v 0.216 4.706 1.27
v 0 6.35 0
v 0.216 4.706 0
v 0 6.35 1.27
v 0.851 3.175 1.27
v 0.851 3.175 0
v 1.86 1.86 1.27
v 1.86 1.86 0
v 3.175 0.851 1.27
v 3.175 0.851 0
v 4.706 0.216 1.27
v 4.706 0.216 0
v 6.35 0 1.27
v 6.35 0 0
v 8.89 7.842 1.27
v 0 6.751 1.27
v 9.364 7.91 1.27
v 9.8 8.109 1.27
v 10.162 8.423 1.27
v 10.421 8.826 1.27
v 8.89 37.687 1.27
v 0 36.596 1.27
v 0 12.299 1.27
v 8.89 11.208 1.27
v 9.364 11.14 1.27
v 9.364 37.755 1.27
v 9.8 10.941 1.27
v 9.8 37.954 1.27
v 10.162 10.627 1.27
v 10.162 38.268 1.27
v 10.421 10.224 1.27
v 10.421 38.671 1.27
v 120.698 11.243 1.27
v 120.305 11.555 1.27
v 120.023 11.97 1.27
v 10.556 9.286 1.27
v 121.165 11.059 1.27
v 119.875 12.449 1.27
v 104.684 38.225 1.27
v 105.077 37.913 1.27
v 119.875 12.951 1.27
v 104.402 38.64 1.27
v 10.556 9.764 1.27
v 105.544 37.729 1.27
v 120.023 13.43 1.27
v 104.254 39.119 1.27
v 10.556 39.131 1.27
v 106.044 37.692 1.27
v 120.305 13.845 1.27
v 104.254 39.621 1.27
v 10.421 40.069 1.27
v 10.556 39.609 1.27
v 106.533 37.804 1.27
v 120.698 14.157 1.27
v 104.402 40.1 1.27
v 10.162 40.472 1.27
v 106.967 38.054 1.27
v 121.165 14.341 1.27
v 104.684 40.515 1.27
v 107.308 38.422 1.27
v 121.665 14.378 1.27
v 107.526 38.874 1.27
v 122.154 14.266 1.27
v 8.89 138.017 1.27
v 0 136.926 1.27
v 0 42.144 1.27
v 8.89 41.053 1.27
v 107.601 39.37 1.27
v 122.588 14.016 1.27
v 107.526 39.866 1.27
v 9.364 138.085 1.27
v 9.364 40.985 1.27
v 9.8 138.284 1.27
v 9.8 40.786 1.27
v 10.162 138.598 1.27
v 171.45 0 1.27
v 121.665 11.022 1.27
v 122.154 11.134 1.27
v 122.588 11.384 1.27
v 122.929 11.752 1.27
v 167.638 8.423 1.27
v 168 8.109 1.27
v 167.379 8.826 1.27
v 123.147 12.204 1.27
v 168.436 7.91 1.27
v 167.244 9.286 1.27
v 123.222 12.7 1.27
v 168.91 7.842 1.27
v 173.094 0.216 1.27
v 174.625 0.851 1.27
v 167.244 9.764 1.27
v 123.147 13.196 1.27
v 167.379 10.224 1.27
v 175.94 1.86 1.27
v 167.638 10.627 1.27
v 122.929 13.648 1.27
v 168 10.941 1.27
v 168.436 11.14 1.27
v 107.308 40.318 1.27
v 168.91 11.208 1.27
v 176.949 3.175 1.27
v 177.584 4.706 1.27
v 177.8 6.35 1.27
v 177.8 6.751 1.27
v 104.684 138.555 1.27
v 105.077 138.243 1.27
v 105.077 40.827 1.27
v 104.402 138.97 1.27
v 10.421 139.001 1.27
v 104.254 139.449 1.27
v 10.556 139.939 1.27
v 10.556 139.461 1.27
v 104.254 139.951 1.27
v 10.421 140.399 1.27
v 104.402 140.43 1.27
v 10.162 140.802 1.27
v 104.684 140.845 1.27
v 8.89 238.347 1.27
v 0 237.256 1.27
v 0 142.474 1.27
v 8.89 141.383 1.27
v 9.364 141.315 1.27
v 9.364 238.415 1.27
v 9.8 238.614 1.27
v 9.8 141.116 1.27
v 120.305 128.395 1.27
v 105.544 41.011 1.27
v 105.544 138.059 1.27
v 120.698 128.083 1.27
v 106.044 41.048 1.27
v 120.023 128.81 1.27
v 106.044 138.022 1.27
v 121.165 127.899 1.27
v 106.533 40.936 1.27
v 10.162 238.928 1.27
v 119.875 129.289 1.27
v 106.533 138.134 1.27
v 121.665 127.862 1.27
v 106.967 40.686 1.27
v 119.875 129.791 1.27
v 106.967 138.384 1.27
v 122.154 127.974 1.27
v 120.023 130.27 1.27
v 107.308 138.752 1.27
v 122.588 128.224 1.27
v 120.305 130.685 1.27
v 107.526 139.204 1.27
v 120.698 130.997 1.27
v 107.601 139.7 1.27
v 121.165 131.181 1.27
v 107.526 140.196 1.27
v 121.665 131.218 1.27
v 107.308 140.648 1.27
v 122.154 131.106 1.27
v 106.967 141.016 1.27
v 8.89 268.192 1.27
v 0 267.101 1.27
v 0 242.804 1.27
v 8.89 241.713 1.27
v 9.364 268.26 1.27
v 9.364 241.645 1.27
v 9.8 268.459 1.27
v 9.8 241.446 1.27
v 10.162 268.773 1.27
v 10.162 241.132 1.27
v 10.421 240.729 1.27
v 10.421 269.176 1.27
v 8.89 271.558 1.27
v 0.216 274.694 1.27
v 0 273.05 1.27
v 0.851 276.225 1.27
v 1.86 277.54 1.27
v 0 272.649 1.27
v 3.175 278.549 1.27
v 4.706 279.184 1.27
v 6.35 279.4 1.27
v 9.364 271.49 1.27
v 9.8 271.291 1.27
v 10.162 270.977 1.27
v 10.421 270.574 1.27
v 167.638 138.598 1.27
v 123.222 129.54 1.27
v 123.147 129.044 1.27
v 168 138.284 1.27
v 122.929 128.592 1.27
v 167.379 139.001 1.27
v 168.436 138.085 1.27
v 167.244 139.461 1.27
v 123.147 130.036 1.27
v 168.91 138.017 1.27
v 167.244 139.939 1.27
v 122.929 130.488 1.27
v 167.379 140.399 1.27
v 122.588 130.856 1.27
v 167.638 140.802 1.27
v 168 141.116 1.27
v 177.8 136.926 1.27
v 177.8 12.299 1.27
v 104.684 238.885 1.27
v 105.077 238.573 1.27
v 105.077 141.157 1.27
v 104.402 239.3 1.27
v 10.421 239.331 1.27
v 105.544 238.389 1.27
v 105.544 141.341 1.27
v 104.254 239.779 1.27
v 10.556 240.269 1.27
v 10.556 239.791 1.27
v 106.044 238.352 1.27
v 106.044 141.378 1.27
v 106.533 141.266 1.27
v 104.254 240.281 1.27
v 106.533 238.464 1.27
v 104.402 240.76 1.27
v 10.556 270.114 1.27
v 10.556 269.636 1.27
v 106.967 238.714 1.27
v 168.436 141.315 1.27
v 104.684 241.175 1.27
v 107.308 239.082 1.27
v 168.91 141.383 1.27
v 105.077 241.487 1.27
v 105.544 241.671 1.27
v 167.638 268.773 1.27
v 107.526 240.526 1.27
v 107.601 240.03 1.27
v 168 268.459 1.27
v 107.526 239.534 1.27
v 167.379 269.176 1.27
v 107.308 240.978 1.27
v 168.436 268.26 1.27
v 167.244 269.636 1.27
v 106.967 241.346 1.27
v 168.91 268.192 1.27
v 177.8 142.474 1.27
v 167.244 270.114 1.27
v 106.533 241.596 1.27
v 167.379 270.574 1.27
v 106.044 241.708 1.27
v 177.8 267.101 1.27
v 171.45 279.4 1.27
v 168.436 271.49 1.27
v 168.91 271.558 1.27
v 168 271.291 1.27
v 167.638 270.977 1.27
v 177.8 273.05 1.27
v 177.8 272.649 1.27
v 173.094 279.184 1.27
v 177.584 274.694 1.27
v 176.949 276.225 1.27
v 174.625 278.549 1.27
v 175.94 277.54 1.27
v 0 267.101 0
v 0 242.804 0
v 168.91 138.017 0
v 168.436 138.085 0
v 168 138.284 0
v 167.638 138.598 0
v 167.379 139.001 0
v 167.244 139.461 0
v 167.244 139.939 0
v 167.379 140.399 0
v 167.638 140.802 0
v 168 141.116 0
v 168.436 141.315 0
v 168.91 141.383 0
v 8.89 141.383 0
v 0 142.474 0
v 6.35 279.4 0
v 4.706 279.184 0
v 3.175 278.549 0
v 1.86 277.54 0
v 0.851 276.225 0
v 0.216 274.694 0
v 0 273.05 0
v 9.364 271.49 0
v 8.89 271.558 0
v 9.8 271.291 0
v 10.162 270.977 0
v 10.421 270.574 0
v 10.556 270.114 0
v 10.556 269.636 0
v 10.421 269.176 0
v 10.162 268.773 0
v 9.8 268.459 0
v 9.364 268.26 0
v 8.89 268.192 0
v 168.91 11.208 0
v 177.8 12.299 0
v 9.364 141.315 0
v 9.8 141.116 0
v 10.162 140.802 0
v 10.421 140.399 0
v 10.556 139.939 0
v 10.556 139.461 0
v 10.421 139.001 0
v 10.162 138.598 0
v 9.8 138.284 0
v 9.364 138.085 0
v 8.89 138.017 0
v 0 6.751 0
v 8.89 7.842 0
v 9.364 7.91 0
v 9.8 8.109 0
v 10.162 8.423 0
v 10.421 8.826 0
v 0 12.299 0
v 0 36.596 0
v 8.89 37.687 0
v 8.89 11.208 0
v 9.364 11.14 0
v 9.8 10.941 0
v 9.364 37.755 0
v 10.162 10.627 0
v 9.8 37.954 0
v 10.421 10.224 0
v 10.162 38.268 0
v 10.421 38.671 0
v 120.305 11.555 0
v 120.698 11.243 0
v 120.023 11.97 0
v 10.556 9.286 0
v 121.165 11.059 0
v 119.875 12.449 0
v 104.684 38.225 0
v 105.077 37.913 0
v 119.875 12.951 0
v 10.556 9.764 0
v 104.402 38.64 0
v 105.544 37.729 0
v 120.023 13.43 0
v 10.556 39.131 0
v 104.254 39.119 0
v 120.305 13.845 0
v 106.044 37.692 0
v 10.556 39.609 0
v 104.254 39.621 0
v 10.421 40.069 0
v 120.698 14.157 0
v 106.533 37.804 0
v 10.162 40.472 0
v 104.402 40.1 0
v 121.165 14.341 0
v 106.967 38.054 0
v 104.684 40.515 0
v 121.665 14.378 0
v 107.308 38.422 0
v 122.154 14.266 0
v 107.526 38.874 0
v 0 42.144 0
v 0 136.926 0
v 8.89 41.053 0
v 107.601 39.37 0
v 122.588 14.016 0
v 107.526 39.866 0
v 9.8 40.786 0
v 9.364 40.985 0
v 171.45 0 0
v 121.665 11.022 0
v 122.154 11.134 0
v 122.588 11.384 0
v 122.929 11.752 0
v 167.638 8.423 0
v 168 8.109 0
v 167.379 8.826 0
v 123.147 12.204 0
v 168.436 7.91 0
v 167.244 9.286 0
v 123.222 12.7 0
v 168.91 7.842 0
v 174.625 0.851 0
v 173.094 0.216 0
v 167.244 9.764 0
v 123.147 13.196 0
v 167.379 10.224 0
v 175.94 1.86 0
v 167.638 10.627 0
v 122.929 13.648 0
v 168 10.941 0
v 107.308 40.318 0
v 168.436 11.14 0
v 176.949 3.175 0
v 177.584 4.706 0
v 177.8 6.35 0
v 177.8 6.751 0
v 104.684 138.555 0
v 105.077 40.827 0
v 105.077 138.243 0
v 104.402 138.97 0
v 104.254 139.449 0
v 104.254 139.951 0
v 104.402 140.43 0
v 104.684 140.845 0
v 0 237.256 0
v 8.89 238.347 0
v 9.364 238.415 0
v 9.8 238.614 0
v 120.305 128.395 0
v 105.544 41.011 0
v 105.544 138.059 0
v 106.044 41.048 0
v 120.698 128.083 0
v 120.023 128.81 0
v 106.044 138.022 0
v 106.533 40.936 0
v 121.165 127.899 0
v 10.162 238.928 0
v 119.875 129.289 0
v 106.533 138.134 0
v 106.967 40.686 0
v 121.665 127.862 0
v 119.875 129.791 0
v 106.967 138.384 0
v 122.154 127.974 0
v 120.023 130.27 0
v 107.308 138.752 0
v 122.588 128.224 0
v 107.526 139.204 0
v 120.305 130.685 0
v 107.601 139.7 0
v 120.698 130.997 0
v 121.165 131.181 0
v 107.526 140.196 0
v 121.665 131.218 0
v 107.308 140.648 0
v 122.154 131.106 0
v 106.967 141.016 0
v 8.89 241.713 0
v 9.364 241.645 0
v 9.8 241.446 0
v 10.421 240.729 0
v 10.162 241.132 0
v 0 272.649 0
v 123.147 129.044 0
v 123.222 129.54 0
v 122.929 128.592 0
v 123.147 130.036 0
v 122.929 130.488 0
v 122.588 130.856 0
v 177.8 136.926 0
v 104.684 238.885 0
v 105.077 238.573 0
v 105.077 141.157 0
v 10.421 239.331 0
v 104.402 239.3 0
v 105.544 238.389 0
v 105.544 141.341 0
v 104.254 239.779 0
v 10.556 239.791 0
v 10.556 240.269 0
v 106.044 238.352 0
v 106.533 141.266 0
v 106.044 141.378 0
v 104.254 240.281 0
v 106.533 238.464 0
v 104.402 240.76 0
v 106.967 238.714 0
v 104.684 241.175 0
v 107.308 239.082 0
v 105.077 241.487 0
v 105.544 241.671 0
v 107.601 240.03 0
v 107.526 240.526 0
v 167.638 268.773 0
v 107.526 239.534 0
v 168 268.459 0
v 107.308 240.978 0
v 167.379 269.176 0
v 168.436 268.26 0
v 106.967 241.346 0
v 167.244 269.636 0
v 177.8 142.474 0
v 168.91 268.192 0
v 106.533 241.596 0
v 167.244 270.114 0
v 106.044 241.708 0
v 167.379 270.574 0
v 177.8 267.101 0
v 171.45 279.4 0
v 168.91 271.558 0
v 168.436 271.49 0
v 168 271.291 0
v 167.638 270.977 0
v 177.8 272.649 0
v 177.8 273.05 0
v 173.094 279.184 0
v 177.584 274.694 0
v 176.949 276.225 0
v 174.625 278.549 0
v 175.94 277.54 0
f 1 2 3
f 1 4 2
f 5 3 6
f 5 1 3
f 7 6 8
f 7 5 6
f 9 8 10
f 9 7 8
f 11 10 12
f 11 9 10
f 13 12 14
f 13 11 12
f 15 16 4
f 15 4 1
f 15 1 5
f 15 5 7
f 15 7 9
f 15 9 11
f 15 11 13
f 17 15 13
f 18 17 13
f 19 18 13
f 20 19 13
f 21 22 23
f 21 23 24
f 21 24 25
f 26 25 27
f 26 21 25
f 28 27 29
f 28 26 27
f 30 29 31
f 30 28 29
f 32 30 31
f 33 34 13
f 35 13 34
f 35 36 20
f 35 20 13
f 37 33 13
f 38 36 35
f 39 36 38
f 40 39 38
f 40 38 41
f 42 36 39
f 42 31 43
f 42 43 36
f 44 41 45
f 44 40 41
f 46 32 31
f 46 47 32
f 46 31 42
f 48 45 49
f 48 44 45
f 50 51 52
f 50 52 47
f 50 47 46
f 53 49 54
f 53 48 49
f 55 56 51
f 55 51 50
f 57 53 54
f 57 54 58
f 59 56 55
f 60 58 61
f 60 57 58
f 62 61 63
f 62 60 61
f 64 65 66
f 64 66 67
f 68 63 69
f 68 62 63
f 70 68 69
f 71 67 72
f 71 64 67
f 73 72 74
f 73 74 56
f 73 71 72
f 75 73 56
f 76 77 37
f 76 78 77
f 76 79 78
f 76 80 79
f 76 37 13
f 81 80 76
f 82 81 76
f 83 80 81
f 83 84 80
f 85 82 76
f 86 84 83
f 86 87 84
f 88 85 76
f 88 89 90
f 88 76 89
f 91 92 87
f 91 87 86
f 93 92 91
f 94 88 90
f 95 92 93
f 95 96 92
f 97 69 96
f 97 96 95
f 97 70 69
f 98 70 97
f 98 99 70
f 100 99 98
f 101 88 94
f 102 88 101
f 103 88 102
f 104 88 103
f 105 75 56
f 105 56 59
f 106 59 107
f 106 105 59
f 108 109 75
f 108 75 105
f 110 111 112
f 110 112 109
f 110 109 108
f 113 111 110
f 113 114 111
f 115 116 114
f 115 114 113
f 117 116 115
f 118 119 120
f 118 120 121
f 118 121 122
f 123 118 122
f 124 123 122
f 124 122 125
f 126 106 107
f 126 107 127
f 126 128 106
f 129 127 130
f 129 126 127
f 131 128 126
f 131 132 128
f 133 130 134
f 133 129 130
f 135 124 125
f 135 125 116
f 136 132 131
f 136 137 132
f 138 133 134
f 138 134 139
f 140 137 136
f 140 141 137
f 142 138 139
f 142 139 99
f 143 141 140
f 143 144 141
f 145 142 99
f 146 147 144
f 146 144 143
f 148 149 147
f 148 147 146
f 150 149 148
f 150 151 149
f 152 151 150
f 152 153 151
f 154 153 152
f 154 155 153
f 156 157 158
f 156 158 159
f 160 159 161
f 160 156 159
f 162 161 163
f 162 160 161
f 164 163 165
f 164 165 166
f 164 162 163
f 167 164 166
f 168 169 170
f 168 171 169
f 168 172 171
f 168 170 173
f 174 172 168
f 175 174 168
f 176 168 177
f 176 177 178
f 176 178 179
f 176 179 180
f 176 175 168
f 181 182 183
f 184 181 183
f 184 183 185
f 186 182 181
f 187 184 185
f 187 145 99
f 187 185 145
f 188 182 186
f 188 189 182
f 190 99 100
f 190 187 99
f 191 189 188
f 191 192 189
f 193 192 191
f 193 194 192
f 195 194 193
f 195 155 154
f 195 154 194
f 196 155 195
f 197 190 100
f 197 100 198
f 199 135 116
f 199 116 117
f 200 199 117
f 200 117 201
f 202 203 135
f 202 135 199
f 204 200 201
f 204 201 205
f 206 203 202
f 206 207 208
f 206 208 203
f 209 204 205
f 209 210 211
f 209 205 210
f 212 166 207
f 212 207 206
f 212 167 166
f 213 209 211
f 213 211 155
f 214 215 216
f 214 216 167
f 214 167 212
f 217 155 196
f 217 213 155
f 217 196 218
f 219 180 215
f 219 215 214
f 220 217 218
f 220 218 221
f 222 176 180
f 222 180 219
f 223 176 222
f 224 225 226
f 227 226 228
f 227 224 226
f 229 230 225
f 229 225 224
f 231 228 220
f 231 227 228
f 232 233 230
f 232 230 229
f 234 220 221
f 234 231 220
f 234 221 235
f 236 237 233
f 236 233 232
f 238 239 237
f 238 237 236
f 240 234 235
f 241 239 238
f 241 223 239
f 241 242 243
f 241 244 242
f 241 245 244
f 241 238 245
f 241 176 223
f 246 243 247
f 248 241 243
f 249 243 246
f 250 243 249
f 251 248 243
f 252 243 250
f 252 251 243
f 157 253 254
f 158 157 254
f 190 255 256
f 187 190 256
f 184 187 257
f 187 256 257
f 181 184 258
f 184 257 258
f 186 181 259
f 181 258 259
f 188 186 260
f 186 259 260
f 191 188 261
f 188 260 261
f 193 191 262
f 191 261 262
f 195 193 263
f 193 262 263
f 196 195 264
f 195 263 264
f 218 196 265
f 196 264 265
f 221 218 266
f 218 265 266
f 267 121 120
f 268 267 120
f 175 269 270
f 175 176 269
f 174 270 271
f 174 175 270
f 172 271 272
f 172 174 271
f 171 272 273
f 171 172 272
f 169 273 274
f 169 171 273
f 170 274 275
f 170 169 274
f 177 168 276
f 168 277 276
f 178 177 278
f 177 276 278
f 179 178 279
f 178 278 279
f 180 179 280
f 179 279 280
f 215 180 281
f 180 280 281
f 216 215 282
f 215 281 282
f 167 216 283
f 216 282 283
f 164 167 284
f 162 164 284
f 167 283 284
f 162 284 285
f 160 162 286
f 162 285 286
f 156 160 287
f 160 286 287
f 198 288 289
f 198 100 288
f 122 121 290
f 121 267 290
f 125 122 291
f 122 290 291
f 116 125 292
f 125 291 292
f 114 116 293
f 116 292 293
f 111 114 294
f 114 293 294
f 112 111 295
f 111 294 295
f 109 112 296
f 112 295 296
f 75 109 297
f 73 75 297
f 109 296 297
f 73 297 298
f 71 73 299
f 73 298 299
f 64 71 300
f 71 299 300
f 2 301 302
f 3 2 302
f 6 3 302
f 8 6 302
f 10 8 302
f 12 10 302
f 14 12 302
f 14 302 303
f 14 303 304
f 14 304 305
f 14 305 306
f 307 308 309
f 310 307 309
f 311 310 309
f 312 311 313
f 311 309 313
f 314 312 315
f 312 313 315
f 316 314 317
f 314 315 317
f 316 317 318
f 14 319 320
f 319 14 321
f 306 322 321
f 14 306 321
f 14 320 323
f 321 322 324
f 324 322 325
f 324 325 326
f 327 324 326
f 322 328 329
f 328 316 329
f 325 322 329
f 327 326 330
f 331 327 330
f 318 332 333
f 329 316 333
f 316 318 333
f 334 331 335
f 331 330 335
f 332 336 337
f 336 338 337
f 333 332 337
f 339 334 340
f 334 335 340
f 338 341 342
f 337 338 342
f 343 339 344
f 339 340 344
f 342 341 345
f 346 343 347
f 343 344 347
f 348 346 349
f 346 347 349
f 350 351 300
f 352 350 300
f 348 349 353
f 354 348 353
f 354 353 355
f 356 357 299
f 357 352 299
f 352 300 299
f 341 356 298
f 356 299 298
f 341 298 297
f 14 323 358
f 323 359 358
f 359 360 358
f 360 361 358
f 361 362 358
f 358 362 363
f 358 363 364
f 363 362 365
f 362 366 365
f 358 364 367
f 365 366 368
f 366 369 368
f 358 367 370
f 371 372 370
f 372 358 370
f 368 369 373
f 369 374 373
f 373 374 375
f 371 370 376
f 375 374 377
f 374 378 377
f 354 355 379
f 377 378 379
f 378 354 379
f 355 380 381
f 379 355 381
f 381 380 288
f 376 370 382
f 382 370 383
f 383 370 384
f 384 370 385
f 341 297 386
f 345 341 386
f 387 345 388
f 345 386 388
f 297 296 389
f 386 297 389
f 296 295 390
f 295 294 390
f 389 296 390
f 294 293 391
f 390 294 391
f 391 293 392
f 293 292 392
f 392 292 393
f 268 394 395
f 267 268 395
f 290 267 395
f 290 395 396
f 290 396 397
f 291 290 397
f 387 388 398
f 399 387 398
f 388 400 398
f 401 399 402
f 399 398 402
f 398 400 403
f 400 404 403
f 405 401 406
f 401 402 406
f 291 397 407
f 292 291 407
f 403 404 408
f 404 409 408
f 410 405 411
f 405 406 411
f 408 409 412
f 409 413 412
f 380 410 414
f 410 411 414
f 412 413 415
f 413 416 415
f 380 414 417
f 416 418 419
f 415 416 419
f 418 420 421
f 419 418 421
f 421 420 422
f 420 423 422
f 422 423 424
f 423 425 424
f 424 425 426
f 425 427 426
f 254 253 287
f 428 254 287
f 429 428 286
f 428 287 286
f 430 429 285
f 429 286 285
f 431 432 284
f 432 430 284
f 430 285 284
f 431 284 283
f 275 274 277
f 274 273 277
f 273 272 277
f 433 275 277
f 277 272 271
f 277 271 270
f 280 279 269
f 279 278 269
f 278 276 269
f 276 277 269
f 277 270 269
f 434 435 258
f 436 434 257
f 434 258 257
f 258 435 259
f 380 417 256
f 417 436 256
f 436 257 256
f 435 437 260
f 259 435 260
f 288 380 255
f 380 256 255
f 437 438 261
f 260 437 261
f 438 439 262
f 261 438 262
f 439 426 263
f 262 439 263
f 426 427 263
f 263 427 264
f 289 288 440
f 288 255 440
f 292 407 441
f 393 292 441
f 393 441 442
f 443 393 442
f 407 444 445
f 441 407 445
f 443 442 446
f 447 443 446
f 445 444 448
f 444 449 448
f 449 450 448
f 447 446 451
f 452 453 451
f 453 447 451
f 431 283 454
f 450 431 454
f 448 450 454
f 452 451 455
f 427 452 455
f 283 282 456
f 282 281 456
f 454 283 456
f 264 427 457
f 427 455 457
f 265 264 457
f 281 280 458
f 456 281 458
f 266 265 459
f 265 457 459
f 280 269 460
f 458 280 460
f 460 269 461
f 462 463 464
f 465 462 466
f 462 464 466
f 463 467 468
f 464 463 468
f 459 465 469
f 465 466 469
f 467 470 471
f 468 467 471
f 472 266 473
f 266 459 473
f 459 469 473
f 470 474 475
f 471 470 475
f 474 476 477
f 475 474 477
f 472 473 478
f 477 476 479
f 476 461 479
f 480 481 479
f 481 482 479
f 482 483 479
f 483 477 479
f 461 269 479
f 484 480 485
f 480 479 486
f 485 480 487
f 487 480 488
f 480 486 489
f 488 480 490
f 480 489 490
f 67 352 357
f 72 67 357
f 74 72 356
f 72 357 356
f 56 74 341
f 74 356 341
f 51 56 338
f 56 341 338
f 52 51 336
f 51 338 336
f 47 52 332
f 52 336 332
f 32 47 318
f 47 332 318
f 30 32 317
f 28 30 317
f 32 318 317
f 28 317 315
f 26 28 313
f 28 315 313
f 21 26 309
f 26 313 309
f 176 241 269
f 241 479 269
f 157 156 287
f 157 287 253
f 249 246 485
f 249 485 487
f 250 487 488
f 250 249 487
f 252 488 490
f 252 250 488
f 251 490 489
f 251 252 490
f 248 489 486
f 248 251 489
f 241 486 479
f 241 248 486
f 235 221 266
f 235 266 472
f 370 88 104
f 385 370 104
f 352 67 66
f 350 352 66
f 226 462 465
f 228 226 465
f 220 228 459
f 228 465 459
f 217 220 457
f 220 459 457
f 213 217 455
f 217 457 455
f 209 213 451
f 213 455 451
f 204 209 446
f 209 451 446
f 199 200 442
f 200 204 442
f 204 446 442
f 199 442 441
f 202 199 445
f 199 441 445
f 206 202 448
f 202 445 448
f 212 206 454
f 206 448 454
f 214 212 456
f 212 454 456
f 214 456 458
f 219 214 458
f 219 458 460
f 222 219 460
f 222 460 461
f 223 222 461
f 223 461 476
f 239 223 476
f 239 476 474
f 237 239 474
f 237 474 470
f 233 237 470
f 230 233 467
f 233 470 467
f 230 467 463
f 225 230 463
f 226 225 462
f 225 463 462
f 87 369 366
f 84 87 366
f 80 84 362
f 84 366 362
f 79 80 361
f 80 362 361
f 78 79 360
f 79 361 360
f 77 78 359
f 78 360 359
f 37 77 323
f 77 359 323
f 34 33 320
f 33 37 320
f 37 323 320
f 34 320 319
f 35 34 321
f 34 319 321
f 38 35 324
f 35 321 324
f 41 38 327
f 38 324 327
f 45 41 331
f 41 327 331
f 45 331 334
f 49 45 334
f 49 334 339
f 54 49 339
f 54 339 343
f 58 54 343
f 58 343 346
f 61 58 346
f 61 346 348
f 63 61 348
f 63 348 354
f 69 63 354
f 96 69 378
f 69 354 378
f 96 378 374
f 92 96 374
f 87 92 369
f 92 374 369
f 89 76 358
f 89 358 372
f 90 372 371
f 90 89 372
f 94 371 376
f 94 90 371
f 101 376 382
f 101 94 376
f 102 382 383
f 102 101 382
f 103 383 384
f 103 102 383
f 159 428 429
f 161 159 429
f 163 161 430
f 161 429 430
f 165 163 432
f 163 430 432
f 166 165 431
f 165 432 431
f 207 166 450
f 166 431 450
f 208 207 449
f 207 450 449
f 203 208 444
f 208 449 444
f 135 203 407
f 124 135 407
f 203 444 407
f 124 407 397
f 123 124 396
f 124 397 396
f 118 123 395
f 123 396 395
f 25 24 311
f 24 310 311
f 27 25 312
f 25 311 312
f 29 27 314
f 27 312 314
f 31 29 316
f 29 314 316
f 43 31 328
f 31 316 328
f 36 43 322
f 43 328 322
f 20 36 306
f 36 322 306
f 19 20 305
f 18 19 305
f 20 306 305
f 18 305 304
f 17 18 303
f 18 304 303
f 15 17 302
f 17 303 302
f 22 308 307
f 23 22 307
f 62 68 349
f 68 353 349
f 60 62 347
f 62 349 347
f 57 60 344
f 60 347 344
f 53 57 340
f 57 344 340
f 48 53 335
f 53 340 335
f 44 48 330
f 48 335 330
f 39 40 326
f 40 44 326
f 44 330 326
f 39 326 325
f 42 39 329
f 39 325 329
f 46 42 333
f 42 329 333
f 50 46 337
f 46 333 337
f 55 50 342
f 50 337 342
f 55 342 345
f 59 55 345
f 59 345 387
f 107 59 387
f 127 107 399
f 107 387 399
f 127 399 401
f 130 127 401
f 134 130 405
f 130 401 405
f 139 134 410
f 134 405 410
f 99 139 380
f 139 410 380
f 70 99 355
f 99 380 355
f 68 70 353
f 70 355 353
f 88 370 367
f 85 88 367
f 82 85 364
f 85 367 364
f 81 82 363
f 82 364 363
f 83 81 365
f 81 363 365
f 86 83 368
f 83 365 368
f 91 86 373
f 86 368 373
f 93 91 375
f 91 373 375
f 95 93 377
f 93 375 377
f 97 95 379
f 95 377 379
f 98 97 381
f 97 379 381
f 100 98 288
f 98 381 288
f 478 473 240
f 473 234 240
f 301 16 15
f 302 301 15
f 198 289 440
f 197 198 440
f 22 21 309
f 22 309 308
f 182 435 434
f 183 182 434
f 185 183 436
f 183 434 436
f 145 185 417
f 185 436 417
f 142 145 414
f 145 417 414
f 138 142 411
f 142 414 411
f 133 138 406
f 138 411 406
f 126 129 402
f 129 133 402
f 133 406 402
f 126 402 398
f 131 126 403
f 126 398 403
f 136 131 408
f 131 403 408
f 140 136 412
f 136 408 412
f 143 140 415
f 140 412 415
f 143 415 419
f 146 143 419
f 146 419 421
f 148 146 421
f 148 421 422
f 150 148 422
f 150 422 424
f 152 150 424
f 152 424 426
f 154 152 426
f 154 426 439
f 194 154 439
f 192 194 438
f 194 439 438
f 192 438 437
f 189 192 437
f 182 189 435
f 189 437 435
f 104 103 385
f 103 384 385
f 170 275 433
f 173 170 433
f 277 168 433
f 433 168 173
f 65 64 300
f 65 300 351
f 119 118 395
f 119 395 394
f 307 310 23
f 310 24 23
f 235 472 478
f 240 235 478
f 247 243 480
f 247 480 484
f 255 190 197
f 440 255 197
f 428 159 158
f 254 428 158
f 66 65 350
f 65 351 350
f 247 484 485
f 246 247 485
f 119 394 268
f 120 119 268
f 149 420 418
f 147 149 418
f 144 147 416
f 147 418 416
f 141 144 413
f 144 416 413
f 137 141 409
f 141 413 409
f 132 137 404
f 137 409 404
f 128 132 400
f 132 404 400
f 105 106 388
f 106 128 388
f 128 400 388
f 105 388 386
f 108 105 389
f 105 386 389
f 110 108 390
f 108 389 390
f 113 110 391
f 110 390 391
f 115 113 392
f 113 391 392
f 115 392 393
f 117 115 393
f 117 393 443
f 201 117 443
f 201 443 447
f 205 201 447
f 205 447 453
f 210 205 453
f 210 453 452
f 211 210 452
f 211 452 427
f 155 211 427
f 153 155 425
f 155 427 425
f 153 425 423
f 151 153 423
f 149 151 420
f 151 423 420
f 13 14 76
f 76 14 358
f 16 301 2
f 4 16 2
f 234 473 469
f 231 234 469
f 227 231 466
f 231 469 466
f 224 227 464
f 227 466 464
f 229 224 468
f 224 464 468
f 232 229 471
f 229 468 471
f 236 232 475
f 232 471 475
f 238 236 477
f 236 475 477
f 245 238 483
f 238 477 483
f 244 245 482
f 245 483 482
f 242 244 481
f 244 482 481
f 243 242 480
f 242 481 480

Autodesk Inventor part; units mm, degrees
ref_plane "YZ Plane" through (0, 0, 0) normal (1, 0, 0) x (0, 1, 0)
ref_plane "XZ Plane" through (0, 0, 0) normal (0, 1, 0) x (-1, 0, 0)
ref_plane "XY Plane" through (0, 0, 0) normal (0, 0, 1) x (1, 0, 0)
sketch "Sketch1" plane through (0, 0, 0) normal (0, 0, 1) x (1, 0, 0)
  line L0 (0, 0) -> (177.8, 0)
  line L1 (177.8, 0) -> (177.8, 279.4)
  line L2 (177.8, 279.4) -> (0, 279.4)
  line L3 (0, 279.4) -> (0, 0)
  line L4 (8.89, 279.4) -> (168.91, 279.4)
  line L5 (168.91, 0) -> (8.89, 0)
  circle A0 centre (8.89, 139.7) radius 1.6828
  circle A1 centre (8.89, 269.875) radius 1.6828
  circle A2 centre (8.89, 9.525) radius 1.6827
  circle A3 centre (168.91, 9.525) radius 1.6827
  circle A4 centre (168.91, 139.7) radius 1.6827
  circle A5 centre (168.91, 269.875) radius 1.6828
  line L6 (13.843, 279.4) -> (163.957, 279.4)
  line L7 (163.957, 0) -> (13.843, 0)
  circle A6 centre (8.89, 240.03) radius 1.6828
  circle A7 centre (8.89, 39.37) radius 1.6828
  circle A8 centre (105.918, 39.37) radius 1.6827
  circle A9 centre (105.918, 139.7) radius 1.6827
  circle A10 centre (105.918, 240.03) radius 1.6828
  circle A11 centre (121.539, 12.7) radius 1.6827
  circle A12 centre (121.539, 129.54) radius 1.6828
  dimension "d0" = 177.8
  dimension "d1" = 279.4
  dimension "d12" = 3.3655
  dimension "d15" = 3.3655
  dimension "d16" = 3.3655
  dimension "d17" = 3.3655
  dimension "d18" = 3.3655
  dimension "d19" = 3.3655
  dimension "d27" = 3.3655
  dimension "d28" = 3.3655
  dimension "d31" = 3.3655
  dimension "d32" = 3.3655
  dimension "d33" = 3.3655
  dimension "d42" = 3.3655
  dimension "d43" = 3.3655
  dimension "d50" = 8.89
  dimension "d51" = 105.918
  dimension "d52" = 121.539
  dimension "d53" = 168.91
  dimension "d54" = 9.525
  dimension "d55" = 39.37
  dimension "d56" = 12.7
  dimension "d57" = 139.7
  dimension "d58" = 129.54
  dimension "d59" = 240.03
  dimension "d60" = 269.875
extrude "Extrusion1" add sketch "Sketch1" along normal blind 1.27
fillet "Fillet1" radius 6.35 4 edges at (0, 279.4, 0.635) (177.8, 279.4, 0.635) (0, 0, 0.635) (177.8, 0, 0.635)
sketch "Sketch2" plane through (0, 0, 1.27) normal (0, 0, 1) x (1, 0, 0)
  arc A0 (171.45, 0) -> (177.8, 6.35) centre (171.45, 6.35) ccw projected
  line L0 (177.8, 6.35) -> (177.8, 273.05) projected
  arc A1 (177.8, 273.05) -> (171.45, 279.4) centre (171.45, 273.05) ccw projected
  line L1 (171.45, 279.4) -> (6.35, 279.4) projected
  arc A2 (6.35, 279.4) -> (0, 273.05) centre (6.35, 273.05) ccw projected
  line L2 (0, 273.05) -> (0, 6.35) projected
  arc A3 (0, 6.35) -> (6.35, 0) centre (6.35, 6.35) ccw projected
  line L3 (6.35, 0) -> (171.45, 0) projected
  circle A4 centre (121.539, 129.54) radius 1.6828 projected
  circle A5 centre (121.539, 12.7) radius 1.6827 projected
  circle A6 centre (105.918, 240.03) radius 1.6828 projected
  circle A7 centre (105.918, 139.7) radius 1.6827 projected
  circle A8 centre (105.918, 39.37) radius 1.6827 projected
  circle A9 centre (8.89, 39.37) radius 1.6828 projected
  circle A10 centre (8.89, 240.03) radius 1.6828 projected
  circle A11 centre (168.91, 269.875) radius 1.6828 projected
  circle A12 centre (168.91, 139.7) radius 1.6827 projected
  circle A13 centre (168.91, 9.525) radius 1.6827 projected
  circle A14 centre (8.89, 9.525) radius 1.6827 projected
  circle A15 centre (8.89, 269.875) radius 1.6828 projected
  circle A16 centre (8.89, 139.7) radius 1.6828 projected
  line L4 (8.89, 141.3827) -> (0, 142.4743)
  line L5 (8.89, 138.0173) -> (0, 136.9257)
  line L6 (0, 142.4743) -> (0, 136.9257)
  arc A17 (8.89, 141.3827) -> (8.89, 138.0173) centre (8.89, 139.7) ccw
  line L7 (8.89, 141.3827) -> (0, 142.4743)
  line L8 (8.89, 138.0173) -> (0, 136.9257)
  line L9 (0, 142.4743) -> (0, 136.9257)
  arc A18 (8.89, 141.3827) -> (8.89, 138.0173) centre (8.89, 139.7) ccw
  line L10 (8.89, 241.7127) -> (0, 242.8043)
  line L11 (8.89, 238.3472) -> (0, 237.2557)
  line L12 (0, 242.8043) -> (0, 237.2557)
  arc A19 (8.89, 241.7127) -> (8.89, 238.3472) centre (8.89, 240.03) ccw
  line L13 (8.89, 271.5577) -> (0, 272.6493)
  line L14 (8.89, 268.1922) -> (0, 267.1007)
  line L15 (0, 272.6493) -> (0, 267.1007)
  arc A20 (8.89, 271.5577) -> (8.89, 268.1922) centre (8.89, 269.875) ccw
  line L16 (8.89, 41.0527) -> (0, 42.1443)
  line L17 (8.89, 37.6872) -> (0, 36.5957)
  line L18 (0, 42.1443) -> (0, 36.5957)
  arc A21 (8.89, 41.0527) -> (8.89, 37.6872) centre (8.89, 39.37) ccw
  line L19 (8.89, 11.2077) -> (0, 12.2993)
  line L20 (8.89, 7.8422) -> (0, 6.7507)
  line L21 (0, 12.2993) -> (0, 6.7507)
  arc A22 (8.89, 11.2077) -> (8.89, 7.8422) centre (8.89, 9.525) ccw
  line L22 (168.91, 138.0173) -> (177.8, 136.9257)
  line L23 (168.91, 141.3827) -> (177.8, 142.4743)
  line L24 (177.8, 136.9257) -> (177.8, 142.4743)
  arc A23 (168.91, 138.0173) -> (168.91, 141.3827) centre (168.91, 139.7) ccw
  line L25 (168.91, 138.0173) -> (177.8, 136.9257)
  line L26 (168.91, 141.3827) -> (177.8, 142.4743)
  line L27 (177.8, 136.9257) -> (177.8, 142.4743)
  arc A24 (168.91, 138.0173) -> (168.91, 141.3827) centre (168.91, 139.7) ccw
  line L28 (168.91, 268.1923) -> (177.8, 267.1007)
  line L29 (168.91, 271.5577) -> (177.8, 272.6493)
  line L30 (177.8, 267.1007) -> (177.8, 272.6493)
  arc A25 (168.91, 268.1923) -> (168.91, 271.5577) centre (168.91, 269.875) ccw
  line L31 (168.91, 7.8423) -> (177.8, 6.7507)
  line L32 (168.91, 11.2078) -> (177.8, 12.2993)
  line L33 (177.8, 6.7507) -> (177.8, 12.2993)
  arc A26 (168.91, 7.8423) -> (168.91, 11.2078) centre (168.91, 9.525) ccw
  point P0 (0, 0)
extrude "Extrusion2" cut sketch "Sketch2" against normal blind 1.27 contours L31 A13 L32 L0 | L22 A12 L23 L0 | L2 L4 A16 L5 | L2 L13 A15 L14
sketch "Sketch3" plane through (0, 0, 1.27) normal (0, 0, 1) x (1, 0, 0)
  circle A0 centre (8.89, 9.525) radius 1.6827 projected
  circle A1 centre (168.91, 269.875) radius 1.6828 projected
  circle A2 centre (8.89, 240.03) radius 1.6828 projected
  circle A3 centre (8.89, 39.37) radius 1.6828 projected
  circle A4 centre (105.918, 39.37) radius 1.6827 projected
  circle A5 centre (105.918, 139.7) radius 1.6827 projected
  circle A6 centre (105.918, 240.03) radius 1.6828 projected
  circle A7 centre (121.539, 12.7) radius 1.6827 projected
  circle A8 centre (121.539, 129.54) radius 1.6828 projected
  line L0 (8.89, 268.1922) -> (0, 267.1007) projected
  line L1 (0, 267.1007) -> (0, 142.4743) projected
  line L2 (0, 142.4743) -> (8.89, 141.3827) projected
  arc A9 (8.89, 138.0173) -> (8.89, 141.3827) centre (8.89, 139.7) ccw projected
  line L3 (8.89, 138.0173) -> (0, 136.9257) projected
  line L4 (0, 136.9257) -> (0, 6.35) projected
  arc A10 (0, 6.35) -> (6.35, 0) centre (6.35, 6.35) ccw projected
  line L5 (6.35, 0) -> (171.45, 0) projected
  arc A11 (171.45, 0) -> (177.8, 6.35) centre (171.45, 6.35) ccw projected
  line L6 (177.8, 6.35) -> (177.8, 6.7507) projected
  line L7 (177.8, 6.7507) -> (168.91, 7.8423) projected
  arc A12 (168.91, 11.2078) -> (168.91, 7.8423) centre (168.91, 9.525) ccw projected
  line L8 (168.91, 11.2078) -> (177.8, 12.2993) projected
  line L9 (177.8, 12.2993) -> (177.8, 136.9257) projected
  line L10 (177.8, 136.9257) -> (168.91, 138.0173) projected
  arc A13 (168.91, 141.3827) -> (168.91, 138.0173) centre (168.91, 139.7) ccw projected
  line L11 (168.91, 141.3827) -> (177.8, 142.4743) projected
  line L12 (177.8, 142.4743) -> (177.8, 273.05) projected
  arc A14 (177.8, 273.05) -> (171.45, 279.4) centre (171.45, 273.05) ccw projected
  line L13 (171.45, 279.4) -> (6.35, 279.4) projected
  arc A15 (6.35, 279.4) -> (0, 273.05) centre (6.35, 273.05) ccw projected
  line L14 (0, 273.05) -> (0, 272.6493) projected
  line L15 (0, 272.6493) -> (8.89, 271.5577) projected
  arc A16 (8.89, 268.1922) -> (8.89, 271.5577) centre (8.89, 269.875) ccw projected
  line L16 (8.89, 11.2077) -> (0, 12.2993)
  line L17 (0, 12.2993) -> (0, 6.7507)
  line L18 (0, 6.7507) -> (8.89, 7.8422)
  arc A17 (8.89, 11.2077) -> (8.89, 7.8422) centre (8.89, 9.525) ccw
  point P0 (0, 0)
extrude "Extrusion3" cut sketch "Sketch3" against normal blind 1.27 contours A0 L18 L4 L16
sketch "Sketch4" plane through (0, 0, 1.27) normal (0, 0, 1) x (1, 0, 0)
  circle A0 centre (121.539, 129.54) radius 1.6828 projected
  circle A1 centre (121.539, 12.7) radius 1.6827 projected
  circle A2 centre (105.918, 240.03) radius 1.6828 projected
  circle A3 centre (105.918, 139.7) radius 1.6827 projected
  circle A4 centre (105.918, 39.37) radius 1.6827 projected
  circle A5 centre (8.89, 39.37) radius 1.6828 projected
  circle A6 centre (8.89, 240.03) radius 1.6828 projected
  circle A7 centre (168.91, 269.875) radius 1.6828 projected
  line L0 (8.89, 7.8422) -> (0, 6.7507) projected
  line L1 (0, 6.7507) -> (0, 6.35) projected
  arc A8 (0, 6.35) -> (6.35, 0) centre (6.35, 6.35) ccw projected
  line L2 (6.35, 0) -> (171.45, 0) projected
  arc A9 (171.45, 0) -> (177.8, 6.35) centre (171.45, 6.35) ccw projected
  line L3 (177.8, 6.35) -> (177.8, 6.7507) projected
  line L4 (177.8, 6.7507) -> (168.91, 7.8423) projected
  arc A10 (168.91, 11.2078) -> (168.91, 7.8423) centre (168.91, 9.525) ccw projected
  line L5 (168.91, 11.2078) -> (177.8, 12.2993) projected
  line L6 (177.8, 12.2993) -> (177.8, 136.9257) projected
  line L7 (177.8, 136.9257) -> (168.91, 138.0173) projected
  arc A11 (168.91, 141.3827) -> (168.91, 138.0173) centre (168.91, 139.7) ccw projected
  line L8 (168.91, 141.3827) -> (177.8, 142.4743) projected
  line L9 (177.8, 142.4743) -> (177.8, 273.05) projected
  arc A12 (177.8, 273.05) -> (171.45, 279.4) centre (171.45, 273.05) ccw projected
  line L10 (171.45, 279.4) -> (6.35, 279.4) projected
  arc A13 (6.35, 279.4) -> (0, 273.05) centre (6.35, 273.05) ccw projected
  line L11 (0, 273.05) -> (0, 272.6493) projected
  line L12 (0, 272.6493) -> (8.89, 271.5577) projected
  arc A14 (8.89, 268.1922) -> (8.89, 271.5577) centre (8.89, 269.875) ccw projected
  line L13 (8.89, 268.1922) -> (0, 267.1007) projected
  line L14 (0, 267.1007) -> (0, 142.4743) projected
  line L15 (0, 142.4743) -> (8.89, 141.3827) projected
  arc A15 (8.89, 138.0173) -> (8.89, 141.3827) centre (8.89, 139.7) ccw projected
  line L16 (8.89, 138.0173) -> (0, 136.9257) projected
  line L17 (0, 136.9257) -> (0, 12.2993) projected
  line L18 (0, 12.2993) -> (8.89, 11.2077) projected
  arc A16 (8.89, 7.8422) -> (8.89, 11.2077) centre (8.89, 9.525) ccw projected
  line L19 (8.89, 41.0527) -> (0, 42.1443)
  line L20 (8.89, 37.6872) -> (0, 36.5957)
  line L21 (0, 42.1443) -> (0, 36.5957)
  arc A17 (8.89, 41.0527) -> (8.89, 37.6872) centre (8.89, 39.37) ccw
  line L22 (8.89, 241.7127) -> (0, 242.8043)
  line L23 (8.89, 238.3472) -> (0, 237.2557)
  line L24 (0, 237.2557) -> (0, 242.8043)
  arc A18 (8.89, 241.7127) -> (8.89, 238.3472) centre (8.89, 240.03) ccw
  line L25 (168.91, 271.5577) -> (177.8, 272.6493)
  line L26 (168.91, 268.1923) -> (177.8, 267.1007)
  line L27 (177.8, 267.1007) -> (177.8, 272.6493)
  arc A19 (168.91, 268.1923) -> (168.91, 271.5577) centre (168.91, 269.875) ccw
  point P0 (0, 0)
extrude "Extrusion4" cut sketch "Sketch2" against normal blind 1.27 contours L2 L16 A9 L17 | L28 A11 L29 L0 | L2 L10 A10 L11
properties part number "MainBoard"
